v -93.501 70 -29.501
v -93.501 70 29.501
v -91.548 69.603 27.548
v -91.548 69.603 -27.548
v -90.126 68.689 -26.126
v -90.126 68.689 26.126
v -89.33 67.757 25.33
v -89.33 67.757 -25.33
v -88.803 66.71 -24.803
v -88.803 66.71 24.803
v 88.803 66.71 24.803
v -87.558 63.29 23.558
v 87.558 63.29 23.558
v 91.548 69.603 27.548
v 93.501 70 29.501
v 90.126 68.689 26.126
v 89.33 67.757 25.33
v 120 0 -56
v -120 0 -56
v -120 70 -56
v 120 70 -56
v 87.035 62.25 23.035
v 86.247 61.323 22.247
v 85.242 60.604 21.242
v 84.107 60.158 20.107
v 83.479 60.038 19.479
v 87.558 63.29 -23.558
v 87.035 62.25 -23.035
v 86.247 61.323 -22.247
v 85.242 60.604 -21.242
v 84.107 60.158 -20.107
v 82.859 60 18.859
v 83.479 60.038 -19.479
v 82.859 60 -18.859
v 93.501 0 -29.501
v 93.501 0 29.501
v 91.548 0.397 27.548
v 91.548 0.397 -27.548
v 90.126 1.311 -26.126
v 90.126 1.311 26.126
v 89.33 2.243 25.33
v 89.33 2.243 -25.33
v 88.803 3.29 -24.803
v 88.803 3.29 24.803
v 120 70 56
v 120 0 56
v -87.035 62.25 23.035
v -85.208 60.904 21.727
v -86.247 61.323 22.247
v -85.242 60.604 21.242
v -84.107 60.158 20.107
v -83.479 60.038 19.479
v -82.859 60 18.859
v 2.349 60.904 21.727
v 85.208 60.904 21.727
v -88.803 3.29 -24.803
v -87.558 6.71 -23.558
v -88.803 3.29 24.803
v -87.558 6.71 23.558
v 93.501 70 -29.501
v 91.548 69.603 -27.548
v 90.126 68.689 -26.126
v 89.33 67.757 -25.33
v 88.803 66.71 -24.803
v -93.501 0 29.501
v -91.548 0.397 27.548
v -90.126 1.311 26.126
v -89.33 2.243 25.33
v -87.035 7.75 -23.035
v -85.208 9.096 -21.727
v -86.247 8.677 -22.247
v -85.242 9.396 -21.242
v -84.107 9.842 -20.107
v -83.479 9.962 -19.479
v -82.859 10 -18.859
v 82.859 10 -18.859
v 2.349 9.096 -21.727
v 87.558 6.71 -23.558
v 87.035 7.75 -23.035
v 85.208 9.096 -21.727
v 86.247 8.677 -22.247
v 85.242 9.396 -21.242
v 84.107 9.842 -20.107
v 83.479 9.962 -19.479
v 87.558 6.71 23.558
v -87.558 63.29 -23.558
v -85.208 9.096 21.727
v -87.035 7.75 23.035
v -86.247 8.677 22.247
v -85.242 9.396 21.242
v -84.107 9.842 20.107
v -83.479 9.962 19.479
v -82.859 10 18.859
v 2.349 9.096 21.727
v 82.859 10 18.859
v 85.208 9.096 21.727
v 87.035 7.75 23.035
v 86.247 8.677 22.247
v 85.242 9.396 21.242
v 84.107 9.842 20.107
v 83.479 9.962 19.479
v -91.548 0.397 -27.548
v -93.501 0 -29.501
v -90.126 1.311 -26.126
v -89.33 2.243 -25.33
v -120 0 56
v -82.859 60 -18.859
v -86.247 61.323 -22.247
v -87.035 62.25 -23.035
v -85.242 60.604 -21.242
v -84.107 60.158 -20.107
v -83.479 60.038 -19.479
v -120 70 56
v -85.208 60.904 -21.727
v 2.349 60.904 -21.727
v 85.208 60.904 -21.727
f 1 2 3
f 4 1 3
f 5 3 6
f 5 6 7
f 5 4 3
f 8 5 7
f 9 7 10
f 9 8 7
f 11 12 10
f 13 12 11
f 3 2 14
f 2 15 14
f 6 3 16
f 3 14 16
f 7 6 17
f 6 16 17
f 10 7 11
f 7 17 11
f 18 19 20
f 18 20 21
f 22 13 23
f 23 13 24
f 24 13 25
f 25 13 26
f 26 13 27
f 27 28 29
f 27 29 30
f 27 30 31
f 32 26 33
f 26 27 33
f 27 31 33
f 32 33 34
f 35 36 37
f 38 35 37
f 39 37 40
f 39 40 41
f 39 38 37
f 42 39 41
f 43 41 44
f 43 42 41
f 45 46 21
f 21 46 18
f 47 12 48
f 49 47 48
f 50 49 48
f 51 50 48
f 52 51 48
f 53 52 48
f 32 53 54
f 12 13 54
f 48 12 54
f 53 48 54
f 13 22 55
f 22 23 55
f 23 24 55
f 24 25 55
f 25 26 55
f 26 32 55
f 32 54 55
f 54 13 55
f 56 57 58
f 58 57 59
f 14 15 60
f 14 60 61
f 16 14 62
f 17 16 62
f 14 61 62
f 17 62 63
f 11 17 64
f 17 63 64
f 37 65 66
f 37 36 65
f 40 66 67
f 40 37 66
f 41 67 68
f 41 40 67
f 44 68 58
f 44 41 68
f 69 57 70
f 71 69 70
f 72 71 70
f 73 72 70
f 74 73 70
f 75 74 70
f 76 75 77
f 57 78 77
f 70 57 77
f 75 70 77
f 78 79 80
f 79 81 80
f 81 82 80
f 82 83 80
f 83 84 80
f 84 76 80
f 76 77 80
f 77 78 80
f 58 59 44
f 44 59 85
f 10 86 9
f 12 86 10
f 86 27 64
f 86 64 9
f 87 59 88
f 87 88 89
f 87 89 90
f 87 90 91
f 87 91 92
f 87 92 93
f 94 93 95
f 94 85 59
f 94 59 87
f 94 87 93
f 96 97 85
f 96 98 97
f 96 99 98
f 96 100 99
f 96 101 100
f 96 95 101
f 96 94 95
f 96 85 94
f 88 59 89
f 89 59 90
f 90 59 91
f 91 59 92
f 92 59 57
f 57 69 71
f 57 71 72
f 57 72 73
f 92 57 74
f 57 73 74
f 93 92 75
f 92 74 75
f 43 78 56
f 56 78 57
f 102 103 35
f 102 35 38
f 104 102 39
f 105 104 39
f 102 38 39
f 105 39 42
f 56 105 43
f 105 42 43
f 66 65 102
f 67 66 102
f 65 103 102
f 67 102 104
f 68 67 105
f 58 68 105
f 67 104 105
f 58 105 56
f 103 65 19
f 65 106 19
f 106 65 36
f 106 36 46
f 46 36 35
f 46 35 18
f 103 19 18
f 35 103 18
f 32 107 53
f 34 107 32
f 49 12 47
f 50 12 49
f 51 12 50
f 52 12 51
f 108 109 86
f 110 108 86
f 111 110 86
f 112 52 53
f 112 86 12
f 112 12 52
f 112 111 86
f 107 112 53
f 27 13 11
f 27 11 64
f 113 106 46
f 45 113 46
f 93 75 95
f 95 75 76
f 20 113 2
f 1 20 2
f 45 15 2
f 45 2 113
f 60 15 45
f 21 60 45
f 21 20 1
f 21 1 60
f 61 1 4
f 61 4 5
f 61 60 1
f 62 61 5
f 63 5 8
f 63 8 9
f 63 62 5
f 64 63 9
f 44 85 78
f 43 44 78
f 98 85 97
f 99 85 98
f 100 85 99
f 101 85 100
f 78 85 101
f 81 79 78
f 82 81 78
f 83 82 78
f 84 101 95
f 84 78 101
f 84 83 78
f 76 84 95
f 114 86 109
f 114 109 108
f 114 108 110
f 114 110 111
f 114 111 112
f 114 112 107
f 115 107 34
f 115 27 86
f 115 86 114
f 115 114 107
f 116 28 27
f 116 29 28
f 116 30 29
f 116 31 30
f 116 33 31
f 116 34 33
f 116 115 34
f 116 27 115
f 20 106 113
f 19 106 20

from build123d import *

# Parameters (mm, degrees)
SKETCH1_W           = 240
SKETCH1_H           = 112
BOSS_EXTRUDE1_DEPTH = 70
SKETCH2_W           = 180
SKETCH2_H           = 52
CUT_EXTRUDE1_DEPTH  = 10
CUT_EXTRUDE1_TAPER  = 20
FILLET1_R           = 5


with BuildPart() as part:
    # Sketch1 → Boss-Extrude1 (new body)
    with BuildSketch(Plane(origin=(0, 0, 0), x_dir=(1, 0, 0), z_dir=(0, 1, 0))):
        Rectangle(SKETCH1_W, SKETCH1_H)
    extrude(amount=BOSS_EXTRUDE1_DEPTH)

    # Sketch2 → Cut-Extrude1 (cut)
    with BuildSketch(Plane(origin=(0, 70, 0), x_dir=(1, 0, 0), z_dir=(0, 1, 0))):
        Rectangle(SKETCH2_W, SKETCH2_H)
    cut_extrude1 = extrude(amount=-CUT_EXTRUDE1_DEPTH, taper=CUT_EXTRUDE1_TAPER, mode=Mode.SUBTRACT)

    # Mirror1: Cut-Extrude1 across plane
    add(cut_extrude1.mirror(Plane.ZX.offset(35)), mode=Mode.SUBTRACT)

    # Fillet1
    fillet1_edges = [part.edges().sort_by_distance(p)[0] for p in [
        (86.360297657, 60, 0),
        (0, 60, 22.360297657),
        (-86.360297657, 60, 0),
        (0, 60, -22.360297657),
        (90, 70, 0),
        (0, 70, -26),
        (-90, 70, 0),
        (0, 70, 26),
        (90, 0, 0),
        (0, 0, -26),
        (-90, 0, 0),
        (0, 0, 26),
        (86.360297657, 10, 0),
        (0, 10, -22.360297657),
        (-86.360297657, 10, 0),
        (0, 10, 22.360297657),
    ]]
    fillet(fillet1_edges, radius=FILLET1_R)


solid = part.part
